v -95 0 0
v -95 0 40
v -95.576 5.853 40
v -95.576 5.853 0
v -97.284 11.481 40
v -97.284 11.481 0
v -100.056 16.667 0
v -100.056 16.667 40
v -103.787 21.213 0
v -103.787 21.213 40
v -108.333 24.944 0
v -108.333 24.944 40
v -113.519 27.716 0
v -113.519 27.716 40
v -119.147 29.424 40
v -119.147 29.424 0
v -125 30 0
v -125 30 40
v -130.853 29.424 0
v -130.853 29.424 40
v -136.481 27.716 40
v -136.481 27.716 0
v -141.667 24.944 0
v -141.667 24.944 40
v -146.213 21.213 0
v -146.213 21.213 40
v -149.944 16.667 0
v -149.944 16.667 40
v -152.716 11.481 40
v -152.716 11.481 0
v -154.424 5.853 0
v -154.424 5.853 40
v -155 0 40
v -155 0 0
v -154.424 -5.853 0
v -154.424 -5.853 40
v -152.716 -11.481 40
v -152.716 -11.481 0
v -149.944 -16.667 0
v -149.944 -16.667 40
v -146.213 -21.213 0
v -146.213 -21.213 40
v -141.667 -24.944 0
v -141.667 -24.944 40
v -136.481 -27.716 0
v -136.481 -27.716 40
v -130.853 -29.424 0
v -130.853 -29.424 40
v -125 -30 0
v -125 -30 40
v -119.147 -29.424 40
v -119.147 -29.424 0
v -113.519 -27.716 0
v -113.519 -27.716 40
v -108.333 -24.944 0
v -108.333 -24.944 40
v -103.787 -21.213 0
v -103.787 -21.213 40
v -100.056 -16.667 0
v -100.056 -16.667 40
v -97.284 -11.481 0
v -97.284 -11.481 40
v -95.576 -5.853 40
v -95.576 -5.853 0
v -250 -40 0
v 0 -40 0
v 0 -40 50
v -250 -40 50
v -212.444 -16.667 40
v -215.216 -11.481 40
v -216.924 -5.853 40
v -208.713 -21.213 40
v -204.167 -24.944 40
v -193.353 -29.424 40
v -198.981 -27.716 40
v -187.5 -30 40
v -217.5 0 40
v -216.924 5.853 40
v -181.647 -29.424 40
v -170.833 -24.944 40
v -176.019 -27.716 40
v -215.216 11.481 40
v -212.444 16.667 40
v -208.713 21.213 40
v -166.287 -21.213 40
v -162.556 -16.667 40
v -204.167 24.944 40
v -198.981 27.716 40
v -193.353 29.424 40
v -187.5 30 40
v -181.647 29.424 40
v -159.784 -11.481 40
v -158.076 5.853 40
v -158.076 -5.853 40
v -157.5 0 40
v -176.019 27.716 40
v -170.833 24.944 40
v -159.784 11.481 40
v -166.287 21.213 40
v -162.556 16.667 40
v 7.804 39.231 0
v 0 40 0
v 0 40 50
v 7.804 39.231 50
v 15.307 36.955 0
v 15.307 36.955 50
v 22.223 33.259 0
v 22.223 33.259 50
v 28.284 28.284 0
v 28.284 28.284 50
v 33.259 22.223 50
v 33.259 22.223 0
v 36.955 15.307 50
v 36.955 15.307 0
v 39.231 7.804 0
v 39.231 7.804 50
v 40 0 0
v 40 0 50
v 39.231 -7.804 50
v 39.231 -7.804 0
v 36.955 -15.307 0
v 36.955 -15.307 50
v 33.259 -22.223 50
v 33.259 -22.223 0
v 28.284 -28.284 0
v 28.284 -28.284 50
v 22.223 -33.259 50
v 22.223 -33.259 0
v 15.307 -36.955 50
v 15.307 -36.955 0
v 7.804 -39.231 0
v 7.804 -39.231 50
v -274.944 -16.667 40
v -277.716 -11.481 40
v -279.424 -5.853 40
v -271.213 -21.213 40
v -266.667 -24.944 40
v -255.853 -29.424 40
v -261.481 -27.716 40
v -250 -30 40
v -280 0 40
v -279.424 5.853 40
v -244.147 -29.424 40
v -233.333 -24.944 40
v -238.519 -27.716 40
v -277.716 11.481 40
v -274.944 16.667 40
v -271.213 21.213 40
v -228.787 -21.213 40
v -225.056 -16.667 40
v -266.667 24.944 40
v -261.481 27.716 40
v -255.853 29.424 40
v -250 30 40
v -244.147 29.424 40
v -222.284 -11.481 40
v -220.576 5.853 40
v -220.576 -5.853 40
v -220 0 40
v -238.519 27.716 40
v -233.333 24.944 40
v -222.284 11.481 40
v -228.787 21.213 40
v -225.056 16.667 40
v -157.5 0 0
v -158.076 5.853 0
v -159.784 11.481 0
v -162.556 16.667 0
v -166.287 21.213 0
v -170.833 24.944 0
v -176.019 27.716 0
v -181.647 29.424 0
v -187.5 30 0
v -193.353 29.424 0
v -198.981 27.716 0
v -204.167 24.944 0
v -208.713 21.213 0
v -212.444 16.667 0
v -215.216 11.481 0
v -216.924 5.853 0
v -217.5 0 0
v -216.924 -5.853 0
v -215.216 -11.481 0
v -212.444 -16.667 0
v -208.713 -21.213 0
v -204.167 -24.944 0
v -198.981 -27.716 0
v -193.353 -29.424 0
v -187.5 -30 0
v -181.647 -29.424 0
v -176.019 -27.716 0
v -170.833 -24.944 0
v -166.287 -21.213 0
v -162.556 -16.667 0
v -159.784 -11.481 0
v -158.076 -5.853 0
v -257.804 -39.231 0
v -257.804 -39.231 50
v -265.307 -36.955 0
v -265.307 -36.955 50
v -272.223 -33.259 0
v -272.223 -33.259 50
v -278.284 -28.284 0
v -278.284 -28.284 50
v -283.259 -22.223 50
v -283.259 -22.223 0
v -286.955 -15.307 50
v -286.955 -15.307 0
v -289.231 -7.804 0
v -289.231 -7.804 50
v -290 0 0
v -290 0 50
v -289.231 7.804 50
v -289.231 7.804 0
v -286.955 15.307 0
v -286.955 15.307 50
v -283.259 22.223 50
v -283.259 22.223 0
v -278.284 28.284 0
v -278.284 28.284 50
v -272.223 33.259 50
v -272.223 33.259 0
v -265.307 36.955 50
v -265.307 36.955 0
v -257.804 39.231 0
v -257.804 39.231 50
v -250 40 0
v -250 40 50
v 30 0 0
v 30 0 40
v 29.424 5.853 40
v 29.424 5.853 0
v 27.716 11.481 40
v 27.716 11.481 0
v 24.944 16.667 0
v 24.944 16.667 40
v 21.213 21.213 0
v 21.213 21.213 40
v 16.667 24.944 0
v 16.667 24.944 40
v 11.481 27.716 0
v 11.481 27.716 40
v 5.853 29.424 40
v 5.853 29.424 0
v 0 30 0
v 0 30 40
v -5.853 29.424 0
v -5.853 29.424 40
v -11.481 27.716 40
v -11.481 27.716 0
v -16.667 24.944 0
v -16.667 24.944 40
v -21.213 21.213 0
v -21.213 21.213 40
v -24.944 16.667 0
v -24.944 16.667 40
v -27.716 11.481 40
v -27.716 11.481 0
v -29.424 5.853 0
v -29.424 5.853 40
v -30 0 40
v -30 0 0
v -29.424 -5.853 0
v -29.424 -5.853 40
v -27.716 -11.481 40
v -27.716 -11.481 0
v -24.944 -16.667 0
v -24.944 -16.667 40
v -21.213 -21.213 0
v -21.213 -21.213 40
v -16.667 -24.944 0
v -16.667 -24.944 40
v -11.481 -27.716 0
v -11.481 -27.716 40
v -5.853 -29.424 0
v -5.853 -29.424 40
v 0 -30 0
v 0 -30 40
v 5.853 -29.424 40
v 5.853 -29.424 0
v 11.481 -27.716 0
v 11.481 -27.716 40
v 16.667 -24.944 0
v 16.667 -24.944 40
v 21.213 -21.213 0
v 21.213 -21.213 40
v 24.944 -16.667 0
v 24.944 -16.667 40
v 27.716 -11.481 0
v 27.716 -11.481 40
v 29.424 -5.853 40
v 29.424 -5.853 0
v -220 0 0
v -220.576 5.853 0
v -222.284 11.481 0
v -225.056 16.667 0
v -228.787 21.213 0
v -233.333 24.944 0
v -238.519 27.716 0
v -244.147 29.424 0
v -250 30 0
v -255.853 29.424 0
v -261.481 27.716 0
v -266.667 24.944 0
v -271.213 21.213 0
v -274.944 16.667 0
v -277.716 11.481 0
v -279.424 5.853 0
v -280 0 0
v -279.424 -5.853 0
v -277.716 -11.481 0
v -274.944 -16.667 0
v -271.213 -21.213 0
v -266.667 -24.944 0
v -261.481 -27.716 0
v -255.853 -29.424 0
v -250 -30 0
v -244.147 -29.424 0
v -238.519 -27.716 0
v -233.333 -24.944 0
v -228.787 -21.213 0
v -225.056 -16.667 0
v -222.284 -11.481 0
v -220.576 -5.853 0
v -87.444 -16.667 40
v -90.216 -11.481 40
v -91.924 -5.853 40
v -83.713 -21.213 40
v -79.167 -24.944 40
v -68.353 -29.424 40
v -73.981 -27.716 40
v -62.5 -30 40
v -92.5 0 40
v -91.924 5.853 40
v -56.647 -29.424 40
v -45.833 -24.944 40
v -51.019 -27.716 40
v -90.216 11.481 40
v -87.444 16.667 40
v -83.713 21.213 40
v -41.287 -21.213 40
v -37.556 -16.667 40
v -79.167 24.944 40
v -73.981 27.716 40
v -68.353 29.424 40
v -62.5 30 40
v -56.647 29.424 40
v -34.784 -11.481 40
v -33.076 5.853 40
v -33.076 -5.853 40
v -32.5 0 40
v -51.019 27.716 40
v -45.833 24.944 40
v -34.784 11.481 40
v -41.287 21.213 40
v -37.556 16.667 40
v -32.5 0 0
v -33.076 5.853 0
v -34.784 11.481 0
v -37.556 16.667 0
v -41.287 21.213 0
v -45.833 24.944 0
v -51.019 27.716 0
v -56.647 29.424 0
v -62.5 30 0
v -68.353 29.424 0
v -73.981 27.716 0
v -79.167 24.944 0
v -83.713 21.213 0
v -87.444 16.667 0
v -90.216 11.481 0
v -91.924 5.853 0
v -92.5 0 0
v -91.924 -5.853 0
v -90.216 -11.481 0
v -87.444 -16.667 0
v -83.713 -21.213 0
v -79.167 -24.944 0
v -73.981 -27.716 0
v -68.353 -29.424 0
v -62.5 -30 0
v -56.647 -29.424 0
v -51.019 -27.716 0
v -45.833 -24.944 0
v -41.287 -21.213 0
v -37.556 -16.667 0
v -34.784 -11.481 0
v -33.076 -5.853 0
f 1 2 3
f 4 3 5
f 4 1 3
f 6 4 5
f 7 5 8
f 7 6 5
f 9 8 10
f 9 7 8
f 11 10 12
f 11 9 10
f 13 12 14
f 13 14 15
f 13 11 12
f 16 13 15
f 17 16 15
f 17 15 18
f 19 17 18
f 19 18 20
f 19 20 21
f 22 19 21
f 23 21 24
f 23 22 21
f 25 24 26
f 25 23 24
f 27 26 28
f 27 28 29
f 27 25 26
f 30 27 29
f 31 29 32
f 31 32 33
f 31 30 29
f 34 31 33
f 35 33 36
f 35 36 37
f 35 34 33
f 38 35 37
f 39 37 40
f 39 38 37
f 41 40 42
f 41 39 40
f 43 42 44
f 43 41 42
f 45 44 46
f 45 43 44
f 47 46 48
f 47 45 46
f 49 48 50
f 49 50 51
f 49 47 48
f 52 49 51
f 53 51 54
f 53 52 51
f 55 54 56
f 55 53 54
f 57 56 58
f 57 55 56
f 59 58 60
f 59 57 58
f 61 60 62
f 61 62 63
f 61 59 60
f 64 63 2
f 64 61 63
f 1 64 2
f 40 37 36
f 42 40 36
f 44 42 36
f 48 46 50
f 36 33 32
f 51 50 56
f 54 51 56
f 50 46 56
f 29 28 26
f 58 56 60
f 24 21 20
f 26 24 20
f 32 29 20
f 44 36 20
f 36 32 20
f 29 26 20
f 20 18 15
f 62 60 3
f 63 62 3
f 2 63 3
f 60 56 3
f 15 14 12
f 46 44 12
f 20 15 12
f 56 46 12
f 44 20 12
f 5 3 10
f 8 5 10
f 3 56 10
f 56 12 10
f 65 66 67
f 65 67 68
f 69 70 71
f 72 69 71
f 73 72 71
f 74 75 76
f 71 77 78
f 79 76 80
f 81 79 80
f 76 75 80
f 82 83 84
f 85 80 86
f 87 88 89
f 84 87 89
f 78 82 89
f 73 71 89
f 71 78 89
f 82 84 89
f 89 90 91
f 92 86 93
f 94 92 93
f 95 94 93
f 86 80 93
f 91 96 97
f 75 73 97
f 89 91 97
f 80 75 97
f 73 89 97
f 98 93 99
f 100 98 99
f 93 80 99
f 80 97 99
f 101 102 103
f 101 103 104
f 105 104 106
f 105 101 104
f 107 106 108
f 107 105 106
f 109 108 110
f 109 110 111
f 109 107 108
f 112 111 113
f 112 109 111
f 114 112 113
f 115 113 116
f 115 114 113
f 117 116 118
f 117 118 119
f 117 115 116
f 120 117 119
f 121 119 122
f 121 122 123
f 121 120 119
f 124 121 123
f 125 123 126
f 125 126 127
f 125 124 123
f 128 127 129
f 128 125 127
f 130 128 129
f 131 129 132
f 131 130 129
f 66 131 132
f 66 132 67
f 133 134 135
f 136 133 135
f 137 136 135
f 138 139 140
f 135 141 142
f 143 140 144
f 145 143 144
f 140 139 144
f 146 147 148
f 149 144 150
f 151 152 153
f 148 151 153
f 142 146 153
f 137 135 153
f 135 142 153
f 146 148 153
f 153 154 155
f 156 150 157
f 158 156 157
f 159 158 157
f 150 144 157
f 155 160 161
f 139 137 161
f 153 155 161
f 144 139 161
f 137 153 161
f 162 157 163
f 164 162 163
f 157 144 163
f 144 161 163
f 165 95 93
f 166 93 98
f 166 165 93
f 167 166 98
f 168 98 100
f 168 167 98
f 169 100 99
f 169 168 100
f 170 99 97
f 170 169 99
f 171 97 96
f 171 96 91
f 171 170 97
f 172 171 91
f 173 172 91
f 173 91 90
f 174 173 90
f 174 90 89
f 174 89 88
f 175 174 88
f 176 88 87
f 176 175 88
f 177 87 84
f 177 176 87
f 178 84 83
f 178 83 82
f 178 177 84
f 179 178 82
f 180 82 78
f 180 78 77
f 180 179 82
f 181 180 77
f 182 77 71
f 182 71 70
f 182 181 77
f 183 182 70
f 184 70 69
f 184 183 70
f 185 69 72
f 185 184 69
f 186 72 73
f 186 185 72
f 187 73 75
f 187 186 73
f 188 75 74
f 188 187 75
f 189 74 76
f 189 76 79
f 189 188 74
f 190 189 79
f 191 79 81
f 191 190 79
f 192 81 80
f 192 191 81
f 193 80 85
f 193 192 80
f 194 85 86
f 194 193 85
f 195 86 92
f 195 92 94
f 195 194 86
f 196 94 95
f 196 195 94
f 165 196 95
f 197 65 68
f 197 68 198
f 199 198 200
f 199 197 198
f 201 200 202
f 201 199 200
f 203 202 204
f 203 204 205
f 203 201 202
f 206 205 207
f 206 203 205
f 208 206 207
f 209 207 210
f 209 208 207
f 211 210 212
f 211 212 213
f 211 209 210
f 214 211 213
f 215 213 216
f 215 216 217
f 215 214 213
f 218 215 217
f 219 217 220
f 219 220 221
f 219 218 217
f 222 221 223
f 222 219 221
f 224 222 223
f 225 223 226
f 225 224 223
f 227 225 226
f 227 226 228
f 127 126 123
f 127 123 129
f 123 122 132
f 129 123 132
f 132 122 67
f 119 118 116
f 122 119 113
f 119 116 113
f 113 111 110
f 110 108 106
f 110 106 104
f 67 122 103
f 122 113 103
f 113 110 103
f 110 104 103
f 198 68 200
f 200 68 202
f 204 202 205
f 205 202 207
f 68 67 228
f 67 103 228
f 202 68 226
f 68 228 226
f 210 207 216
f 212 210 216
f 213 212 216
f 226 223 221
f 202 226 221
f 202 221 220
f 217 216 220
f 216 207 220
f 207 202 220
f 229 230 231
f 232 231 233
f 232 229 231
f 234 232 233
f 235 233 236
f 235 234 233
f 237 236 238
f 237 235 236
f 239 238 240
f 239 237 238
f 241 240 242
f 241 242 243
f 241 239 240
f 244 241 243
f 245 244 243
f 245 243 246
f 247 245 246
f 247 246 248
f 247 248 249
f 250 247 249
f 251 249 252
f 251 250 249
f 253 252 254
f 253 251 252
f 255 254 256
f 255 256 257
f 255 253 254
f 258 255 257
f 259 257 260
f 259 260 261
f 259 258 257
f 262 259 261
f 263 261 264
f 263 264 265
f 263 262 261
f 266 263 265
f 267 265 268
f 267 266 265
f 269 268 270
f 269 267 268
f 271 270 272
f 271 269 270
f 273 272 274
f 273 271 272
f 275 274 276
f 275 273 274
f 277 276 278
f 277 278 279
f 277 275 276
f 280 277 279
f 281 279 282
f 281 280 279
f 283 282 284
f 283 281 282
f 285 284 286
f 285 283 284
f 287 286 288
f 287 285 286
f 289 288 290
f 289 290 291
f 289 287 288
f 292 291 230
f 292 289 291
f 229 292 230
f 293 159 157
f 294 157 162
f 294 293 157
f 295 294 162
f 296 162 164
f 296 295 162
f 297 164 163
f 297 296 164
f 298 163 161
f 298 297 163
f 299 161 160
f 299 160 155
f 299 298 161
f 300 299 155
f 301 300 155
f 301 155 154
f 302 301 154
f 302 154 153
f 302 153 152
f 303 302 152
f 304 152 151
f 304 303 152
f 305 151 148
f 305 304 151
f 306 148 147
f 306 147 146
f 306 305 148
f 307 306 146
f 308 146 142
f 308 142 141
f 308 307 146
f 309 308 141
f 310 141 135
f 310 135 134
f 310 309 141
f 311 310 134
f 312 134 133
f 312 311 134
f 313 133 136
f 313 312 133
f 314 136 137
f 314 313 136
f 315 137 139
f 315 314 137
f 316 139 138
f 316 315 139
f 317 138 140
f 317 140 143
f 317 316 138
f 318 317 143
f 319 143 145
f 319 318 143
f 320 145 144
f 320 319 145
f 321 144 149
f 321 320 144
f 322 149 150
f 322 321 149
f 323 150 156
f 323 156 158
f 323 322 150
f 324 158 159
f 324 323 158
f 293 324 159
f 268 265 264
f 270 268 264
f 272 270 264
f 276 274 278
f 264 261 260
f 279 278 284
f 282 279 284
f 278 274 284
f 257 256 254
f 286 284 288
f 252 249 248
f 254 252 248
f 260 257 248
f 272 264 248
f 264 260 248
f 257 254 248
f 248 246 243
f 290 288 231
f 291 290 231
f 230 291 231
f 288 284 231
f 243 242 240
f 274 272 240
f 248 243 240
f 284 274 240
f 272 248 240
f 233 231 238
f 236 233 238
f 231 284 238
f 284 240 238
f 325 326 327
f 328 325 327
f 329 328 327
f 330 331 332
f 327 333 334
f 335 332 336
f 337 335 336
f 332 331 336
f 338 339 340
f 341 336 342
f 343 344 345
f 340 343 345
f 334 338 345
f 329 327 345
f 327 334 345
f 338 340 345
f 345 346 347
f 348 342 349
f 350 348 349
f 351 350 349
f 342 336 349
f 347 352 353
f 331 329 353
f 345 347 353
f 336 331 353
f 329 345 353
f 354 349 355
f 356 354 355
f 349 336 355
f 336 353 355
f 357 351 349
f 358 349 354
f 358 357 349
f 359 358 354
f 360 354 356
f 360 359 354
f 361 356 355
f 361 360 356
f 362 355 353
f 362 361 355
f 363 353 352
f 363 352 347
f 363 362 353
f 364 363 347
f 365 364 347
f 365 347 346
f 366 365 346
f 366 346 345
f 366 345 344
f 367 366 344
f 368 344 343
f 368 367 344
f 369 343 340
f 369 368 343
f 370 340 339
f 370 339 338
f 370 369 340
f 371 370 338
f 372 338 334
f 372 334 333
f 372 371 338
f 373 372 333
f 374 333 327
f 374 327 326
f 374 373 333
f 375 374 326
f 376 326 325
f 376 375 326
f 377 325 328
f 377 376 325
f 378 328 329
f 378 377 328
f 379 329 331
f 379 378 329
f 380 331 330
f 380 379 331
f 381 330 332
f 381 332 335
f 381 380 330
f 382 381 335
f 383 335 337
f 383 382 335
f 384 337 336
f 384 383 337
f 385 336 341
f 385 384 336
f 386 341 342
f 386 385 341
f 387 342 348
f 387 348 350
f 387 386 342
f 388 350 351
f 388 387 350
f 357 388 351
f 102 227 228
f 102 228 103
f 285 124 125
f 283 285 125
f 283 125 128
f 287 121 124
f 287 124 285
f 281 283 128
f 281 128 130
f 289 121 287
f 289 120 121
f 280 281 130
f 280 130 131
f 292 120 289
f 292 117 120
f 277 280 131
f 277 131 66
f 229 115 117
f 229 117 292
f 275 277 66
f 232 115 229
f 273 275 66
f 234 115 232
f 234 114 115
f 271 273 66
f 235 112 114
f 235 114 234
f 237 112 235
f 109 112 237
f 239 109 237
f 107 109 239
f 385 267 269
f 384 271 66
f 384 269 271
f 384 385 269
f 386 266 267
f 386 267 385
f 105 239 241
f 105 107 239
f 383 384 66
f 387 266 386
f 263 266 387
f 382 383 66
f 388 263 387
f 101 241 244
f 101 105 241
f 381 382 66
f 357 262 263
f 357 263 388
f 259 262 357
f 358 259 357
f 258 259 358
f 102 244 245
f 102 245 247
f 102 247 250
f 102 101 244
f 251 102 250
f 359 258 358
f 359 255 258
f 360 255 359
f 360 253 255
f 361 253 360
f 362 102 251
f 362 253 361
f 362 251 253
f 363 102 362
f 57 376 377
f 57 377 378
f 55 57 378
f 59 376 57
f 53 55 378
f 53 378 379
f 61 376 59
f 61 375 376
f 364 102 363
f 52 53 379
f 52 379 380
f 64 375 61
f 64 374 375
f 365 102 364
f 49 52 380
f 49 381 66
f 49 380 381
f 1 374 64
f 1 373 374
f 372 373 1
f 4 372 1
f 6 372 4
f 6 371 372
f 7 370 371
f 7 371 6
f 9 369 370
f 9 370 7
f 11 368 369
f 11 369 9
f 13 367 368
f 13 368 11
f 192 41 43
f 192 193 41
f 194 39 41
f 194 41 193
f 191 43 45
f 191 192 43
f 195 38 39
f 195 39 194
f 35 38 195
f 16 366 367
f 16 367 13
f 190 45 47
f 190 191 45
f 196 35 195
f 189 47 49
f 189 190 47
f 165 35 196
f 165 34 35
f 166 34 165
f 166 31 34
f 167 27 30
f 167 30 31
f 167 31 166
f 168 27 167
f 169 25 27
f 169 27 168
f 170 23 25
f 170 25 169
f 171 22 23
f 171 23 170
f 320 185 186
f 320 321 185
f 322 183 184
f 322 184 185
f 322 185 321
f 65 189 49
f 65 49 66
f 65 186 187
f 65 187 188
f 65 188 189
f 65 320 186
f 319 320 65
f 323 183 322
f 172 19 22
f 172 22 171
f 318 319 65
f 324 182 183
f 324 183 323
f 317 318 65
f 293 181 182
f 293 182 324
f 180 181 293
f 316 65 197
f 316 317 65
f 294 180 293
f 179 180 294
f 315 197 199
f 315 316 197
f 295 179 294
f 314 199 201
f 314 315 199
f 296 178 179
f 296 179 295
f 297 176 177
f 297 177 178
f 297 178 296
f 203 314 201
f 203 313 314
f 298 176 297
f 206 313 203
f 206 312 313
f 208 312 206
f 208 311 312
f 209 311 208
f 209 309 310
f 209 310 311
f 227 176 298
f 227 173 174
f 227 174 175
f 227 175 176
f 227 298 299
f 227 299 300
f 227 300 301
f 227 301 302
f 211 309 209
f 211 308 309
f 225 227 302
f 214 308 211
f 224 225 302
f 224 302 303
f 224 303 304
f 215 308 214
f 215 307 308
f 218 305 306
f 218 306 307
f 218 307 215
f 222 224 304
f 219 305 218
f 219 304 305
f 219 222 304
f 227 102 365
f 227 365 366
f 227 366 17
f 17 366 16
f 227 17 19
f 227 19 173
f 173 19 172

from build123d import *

# Parameters (mm, degrees)
EXTRUDE_1_DEPTH     = 50
SKETCH_1_3_R        = 30
CUT_EXTRUDE_1_DEPTH = 40


with BuildPart() as part:
    # 스케치1 → 보스-돌출1 (new body)
    with BuildSketch(Plane.XY):
        with BuildLine():
            Line((-250, -40), (0, -40))
            ThreePointArc((0, -40), (40, 0), (0, 40))
            Line((0, 40), (-250, 40))
            ThreePointArc((-250, 40), (-290, 0), (-250, -40))
        make_face()
    extrude(amount=EXTRUDE_1_DEPTH)

    # 스케치1<3> → 컷-돌출1 (cut)
    with BuildSketch(Plane.XY):
        with Locations((-250, 0)):
            Circle(SKETCH_1_3_R)
        with Locations((-187.5, 0)):
            Circle(SKETCH_1_3_R)
        with Locations((-125, 0)):
            Circle(SKETCH_1_3_R)
        with Locations((-62.5, 0)):
            Circle(SKETCH_1_3_R)
        Circle(SKETCH_1_3_R)
    extrude(amount=CUT_EXTRUDE_1_DEPTH, mode=Mode.SUBTRACT)


solid = part.part
